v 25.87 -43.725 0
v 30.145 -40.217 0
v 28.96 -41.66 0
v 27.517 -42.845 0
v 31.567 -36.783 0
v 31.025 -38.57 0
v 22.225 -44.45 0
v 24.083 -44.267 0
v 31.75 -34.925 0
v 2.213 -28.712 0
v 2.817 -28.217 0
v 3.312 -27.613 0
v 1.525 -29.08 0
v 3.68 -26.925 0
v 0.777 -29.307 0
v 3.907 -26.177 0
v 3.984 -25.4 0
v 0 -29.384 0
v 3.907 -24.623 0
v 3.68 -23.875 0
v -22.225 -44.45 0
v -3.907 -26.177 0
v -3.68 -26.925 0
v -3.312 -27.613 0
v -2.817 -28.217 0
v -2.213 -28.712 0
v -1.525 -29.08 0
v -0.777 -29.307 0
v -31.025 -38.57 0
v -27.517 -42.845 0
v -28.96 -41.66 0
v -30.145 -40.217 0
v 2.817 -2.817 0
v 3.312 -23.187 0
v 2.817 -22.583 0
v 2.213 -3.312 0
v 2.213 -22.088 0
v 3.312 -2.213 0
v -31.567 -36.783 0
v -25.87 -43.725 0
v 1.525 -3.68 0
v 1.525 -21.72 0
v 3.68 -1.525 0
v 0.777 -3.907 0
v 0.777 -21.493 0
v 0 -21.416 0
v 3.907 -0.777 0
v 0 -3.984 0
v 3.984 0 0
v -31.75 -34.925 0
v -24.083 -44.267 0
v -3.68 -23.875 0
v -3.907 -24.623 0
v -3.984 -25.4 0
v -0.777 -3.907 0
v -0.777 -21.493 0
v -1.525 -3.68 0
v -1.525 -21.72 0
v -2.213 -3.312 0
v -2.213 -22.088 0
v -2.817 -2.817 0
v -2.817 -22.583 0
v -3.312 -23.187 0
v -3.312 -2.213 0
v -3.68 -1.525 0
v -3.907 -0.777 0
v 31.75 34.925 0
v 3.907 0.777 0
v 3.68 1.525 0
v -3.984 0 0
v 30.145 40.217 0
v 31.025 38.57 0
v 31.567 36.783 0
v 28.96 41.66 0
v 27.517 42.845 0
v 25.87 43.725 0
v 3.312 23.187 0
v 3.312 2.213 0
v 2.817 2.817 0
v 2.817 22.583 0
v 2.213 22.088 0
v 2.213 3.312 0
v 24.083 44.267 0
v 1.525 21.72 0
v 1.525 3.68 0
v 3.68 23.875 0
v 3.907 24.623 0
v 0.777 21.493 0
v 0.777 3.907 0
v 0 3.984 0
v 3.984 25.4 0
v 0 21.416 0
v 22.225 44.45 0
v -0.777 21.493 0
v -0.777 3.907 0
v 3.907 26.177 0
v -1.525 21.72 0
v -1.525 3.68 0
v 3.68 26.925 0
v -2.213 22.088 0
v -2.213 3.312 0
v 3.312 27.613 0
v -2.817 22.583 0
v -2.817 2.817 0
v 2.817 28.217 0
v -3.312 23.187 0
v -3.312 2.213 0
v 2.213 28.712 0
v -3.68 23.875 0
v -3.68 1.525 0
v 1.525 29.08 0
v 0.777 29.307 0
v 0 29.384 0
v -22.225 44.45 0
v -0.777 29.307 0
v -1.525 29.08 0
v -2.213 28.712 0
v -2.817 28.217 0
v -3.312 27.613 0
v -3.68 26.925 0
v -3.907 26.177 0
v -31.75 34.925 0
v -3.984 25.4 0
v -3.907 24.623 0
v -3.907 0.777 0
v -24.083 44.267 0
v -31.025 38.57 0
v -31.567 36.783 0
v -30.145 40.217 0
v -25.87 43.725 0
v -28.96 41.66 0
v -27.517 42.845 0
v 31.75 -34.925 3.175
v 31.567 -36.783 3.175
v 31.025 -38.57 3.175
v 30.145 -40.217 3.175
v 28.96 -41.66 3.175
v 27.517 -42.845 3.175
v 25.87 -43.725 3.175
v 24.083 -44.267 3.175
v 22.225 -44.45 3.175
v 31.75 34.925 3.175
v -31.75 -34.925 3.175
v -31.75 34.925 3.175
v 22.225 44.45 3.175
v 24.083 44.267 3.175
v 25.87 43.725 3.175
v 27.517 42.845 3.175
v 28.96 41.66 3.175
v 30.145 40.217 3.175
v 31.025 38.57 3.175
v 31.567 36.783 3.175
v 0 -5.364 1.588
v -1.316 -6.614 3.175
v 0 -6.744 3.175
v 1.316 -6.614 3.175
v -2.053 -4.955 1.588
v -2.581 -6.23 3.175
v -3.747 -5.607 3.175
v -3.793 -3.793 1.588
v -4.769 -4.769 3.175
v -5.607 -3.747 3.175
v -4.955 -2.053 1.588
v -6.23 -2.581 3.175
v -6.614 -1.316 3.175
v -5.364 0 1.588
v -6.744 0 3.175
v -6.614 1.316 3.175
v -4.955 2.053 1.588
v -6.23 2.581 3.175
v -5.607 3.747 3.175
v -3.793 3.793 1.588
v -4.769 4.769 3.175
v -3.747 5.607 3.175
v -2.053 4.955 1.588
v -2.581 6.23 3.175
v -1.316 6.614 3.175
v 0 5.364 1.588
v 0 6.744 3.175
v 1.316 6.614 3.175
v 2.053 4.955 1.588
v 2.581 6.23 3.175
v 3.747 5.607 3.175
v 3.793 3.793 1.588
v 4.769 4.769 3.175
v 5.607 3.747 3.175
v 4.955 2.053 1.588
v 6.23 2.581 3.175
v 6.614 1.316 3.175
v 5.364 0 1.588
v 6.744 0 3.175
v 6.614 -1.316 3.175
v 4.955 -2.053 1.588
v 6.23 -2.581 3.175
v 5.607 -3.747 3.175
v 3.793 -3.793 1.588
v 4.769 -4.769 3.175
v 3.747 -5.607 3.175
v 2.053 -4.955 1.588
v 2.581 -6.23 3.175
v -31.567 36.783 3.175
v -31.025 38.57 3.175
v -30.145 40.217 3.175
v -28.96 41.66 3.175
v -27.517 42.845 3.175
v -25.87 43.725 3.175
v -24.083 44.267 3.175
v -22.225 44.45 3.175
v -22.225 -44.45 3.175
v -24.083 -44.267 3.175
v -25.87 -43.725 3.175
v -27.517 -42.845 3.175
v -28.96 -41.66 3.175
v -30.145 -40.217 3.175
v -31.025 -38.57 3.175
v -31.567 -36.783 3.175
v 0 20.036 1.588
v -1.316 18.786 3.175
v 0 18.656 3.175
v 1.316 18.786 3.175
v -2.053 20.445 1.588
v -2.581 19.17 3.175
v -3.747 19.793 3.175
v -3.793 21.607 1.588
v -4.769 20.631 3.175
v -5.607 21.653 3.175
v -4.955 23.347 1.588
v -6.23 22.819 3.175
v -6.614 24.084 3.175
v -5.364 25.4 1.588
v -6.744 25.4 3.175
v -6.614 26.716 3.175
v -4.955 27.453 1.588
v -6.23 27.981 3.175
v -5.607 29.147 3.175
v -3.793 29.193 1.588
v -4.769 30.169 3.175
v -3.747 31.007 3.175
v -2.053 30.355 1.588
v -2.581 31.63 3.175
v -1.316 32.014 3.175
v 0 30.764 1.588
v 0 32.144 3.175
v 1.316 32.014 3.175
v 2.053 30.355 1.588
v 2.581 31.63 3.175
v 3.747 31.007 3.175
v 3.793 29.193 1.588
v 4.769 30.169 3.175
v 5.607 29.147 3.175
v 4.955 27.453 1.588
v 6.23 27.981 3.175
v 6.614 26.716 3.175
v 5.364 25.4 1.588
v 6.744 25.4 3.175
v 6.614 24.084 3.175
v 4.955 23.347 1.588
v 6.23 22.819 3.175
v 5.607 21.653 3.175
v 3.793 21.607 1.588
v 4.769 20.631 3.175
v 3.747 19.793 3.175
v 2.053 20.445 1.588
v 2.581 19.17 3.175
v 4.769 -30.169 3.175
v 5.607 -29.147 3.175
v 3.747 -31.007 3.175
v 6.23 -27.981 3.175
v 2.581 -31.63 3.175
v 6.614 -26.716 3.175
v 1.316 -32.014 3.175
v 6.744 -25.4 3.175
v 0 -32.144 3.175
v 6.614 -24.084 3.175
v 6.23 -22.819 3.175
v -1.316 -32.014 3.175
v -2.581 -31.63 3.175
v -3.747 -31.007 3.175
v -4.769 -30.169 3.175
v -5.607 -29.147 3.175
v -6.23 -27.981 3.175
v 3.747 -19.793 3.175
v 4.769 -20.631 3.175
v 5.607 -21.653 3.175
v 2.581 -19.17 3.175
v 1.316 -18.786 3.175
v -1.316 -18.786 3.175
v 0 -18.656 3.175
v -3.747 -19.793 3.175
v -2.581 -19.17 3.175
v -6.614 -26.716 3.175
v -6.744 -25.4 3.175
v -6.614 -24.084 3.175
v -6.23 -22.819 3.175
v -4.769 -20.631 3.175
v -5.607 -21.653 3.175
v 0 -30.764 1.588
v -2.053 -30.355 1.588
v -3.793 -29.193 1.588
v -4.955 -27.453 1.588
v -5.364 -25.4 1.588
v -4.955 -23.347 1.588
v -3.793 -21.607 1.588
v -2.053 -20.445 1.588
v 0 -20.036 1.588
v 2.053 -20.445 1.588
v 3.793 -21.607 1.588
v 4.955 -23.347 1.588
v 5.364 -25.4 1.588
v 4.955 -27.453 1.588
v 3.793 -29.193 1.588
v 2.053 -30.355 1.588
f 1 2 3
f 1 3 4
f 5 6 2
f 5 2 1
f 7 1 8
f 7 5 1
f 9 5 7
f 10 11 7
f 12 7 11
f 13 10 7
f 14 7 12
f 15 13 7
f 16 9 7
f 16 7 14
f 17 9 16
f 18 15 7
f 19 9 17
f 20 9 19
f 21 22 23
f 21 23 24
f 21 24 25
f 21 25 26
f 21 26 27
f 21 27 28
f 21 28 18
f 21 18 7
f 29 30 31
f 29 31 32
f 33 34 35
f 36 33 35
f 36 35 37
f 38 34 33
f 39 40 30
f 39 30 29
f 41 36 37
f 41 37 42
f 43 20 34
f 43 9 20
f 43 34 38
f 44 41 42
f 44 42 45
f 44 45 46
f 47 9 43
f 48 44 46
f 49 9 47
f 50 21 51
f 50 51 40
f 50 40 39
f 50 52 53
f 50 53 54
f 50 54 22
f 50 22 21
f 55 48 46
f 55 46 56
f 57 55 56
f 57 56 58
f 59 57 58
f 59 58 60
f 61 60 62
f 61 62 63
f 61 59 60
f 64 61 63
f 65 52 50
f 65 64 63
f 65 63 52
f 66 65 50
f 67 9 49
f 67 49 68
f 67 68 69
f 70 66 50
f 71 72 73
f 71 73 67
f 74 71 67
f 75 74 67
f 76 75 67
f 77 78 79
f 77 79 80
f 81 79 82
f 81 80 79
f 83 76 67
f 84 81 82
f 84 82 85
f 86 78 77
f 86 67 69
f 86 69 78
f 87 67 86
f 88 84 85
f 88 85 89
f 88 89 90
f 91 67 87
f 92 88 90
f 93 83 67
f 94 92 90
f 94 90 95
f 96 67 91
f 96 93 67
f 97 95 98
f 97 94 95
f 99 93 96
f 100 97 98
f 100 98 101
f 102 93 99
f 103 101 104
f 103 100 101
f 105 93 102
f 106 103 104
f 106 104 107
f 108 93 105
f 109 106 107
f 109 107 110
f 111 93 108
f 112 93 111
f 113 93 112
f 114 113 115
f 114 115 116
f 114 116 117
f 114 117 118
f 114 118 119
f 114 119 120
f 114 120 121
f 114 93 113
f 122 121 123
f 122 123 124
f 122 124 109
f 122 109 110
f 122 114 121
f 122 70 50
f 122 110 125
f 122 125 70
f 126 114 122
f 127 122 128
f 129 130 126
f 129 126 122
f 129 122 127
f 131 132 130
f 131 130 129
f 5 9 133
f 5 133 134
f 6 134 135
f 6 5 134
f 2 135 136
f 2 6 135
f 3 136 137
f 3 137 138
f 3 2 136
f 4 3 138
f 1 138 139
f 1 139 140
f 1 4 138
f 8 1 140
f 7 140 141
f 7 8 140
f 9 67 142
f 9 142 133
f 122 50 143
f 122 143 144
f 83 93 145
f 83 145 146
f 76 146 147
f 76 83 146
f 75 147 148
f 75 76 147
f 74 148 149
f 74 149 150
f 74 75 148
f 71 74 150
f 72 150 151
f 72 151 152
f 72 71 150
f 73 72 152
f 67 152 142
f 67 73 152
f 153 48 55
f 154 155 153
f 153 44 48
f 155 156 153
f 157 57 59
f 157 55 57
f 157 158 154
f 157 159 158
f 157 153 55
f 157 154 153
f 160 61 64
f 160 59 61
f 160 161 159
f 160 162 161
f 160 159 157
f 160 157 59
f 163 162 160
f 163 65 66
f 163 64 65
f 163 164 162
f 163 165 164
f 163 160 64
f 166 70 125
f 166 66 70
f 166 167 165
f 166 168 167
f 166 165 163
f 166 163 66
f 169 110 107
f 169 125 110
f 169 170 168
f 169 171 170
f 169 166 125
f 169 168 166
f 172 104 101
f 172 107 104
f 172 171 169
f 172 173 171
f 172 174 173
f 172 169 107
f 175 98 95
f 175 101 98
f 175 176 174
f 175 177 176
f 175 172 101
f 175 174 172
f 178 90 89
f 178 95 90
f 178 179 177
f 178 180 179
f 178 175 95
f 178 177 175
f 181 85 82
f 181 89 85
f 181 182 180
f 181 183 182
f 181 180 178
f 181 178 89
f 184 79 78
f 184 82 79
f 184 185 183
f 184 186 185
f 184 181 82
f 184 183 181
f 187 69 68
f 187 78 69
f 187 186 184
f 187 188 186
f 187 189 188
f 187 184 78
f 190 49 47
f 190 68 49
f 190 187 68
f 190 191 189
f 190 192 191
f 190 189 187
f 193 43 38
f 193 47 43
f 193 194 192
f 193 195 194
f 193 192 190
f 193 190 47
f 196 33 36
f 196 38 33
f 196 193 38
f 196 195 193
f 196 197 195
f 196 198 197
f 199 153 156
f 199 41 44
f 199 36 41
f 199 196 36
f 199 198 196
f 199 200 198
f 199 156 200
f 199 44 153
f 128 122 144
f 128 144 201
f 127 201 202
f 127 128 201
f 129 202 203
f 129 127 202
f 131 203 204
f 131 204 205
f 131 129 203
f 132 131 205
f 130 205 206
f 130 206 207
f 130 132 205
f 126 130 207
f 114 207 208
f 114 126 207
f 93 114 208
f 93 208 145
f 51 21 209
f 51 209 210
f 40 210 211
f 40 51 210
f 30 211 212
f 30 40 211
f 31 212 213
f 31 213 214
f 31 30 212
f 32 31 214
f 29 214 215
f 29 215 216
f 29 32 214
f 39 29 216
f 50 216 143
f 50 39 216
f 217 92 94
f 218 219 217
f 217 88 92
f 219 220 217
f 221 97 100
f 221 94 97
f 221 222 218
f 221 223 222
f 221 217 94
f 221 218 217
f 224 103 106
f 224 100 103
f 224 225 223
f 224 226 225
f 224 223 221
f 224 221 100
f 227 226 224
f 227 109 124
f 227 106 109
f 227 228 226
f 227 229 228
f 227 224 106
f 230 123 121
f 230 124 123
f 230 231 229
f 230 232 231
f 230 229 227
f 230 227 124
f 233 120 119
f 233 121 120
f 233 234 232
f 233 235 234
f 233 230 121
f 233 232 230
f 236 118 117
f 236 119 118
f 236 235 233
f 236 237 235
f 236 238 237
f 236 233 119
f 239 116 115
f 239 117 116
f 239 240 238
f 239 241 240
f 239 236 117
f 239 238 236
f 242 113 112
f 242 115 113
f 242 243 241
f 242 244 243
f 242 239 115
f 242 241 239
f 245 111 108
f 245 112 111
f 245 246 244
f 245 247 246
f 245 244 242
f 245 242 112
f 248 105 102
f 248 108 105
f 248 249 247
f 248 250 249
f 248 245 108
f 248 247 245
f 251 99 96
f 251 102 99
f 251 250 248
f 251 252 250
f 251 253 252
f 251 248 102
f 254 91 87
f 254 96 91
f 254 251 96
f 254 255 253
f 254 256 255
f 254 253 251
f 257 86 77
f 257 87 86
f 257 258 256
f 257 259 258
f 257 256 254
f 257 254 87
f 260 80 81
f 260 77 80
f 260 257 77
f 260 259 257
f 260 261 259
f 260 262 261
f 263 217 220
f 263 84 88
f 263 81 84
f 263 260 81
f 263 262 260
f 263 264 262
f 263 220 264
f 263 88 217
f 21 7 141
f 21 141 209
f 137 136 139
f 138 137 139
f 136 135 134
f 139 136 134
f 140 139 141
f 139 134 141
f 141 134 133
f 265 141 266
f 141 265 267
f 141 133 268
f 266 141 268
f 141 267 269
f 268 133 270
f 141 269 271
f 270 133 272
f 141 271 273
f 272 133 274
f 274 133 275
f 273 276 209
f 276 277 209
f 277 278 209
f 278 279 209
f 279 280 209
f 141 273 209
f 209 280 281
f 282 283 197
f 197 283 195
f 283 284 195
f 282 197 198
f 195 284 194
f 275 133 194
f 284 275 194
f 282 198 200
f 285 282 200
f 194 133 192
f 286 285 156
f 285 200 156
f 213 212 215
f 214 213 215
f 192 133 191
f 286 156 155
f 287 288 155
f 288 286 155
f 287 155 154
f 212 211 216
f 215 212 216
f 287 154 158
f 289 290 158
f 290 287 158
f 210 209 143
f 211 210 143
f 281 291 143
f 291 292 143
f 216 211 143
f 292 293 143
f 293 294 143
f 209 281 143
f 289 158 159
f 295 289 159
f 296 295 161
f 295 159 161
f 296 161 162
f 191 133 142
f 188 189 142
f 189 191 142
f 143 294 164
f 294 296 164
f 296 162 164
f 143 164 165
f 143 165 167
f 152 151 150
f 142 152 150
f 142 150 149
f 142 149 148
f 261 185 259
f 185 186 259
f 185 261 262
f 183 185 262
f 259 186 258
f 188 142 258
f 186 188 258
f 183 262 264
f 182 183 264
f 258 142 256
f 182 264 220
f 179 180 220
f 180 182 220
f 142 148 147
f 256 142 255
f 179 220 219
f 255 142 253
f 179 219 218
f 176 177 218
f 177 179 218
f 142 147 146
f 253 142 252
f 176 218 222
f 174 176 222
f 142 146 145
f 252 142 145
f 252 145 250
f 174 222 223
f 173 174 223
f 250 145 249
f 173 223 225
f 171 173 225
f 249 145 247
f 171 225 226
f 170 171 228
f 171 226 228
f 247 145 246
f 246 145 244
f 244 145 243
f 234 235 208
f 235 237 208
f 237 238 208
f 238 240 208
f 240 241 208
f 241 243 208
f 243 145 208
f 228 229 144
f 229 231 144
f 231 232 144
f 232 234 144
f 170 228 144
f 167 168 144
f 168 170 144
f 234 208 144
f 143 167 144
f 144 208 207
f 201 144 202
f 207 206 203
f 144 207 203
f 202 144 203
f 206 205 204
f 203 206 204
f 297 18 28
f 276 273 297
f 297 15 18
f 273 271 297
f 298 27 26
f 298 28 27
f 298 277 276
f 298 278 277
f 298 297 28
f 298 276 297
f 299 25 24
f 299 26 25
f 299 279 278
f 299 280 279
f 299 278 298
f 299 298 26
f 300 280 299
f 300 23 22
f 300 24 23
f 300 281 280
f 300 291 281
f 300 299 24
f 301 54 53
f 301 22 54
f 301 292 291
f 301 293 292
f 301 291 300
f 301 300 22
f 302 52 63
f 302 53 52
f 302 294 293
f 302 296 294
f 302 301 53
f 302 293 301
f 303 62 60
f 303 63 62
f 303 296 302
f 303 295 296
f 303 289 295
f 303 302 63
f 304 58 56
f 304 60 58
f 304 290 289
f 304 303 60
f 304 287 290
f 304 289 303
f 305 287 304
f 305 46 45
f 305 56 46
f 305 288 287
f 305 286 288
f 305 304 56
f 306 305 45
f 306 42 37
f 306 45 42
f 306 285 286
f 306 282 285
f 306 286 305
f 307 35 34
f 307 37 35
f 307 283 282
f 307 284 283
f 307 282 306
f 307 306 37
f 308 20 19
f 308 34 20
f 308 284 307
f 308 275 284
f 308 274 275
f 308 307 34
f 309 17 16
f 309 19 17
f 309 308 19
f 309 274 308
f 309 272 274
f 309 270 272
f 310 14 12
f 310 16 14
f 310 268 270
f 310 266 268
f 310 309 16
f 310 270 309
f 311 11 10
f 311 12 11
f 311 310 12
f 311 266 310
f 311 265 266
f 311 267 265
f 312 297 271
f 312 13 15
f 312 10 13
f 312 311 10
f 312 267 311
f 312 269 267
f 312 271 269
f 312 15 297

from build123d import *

# Parameters (mm, degrees)
SKETCH1_R                                    = 2.5527
BOSS_EXTRUDE1_DEPTH                          = 3.175
CSK_FOR_1_4_FLAT_HEAD_SOCKET_CAP_SCR_2_COUNT = 2
CSK_FOR_1_4_FLAT_HEAD_SOCKET_CAP_SCR_2_PITCH = 25.4
CSK_FOR_1_4_FLAT_HEAD_SOCKET_CAP_SCR_3_COUNT = 2
CSK_FOR_1_4_FLAT_HEAD_SOCKET_CAP_SCR_3_PITCH = 50.8


with BuildPart() as part:
    # Sketch1 → Boss-Extrude1 (new body)
    with BuildSketch(Plane.XY):
        with BuildLine():
            Line((-22.225, 44.45), (22.225, 44.45))
            ThreePointArc((22.225, 44.45), (28.960192091, 41.660192091), (31.75, 34.925))
            Line((31.75, 34.925), (31.75, -34.925))
            ThreePointArc((31.75, -34.925), (28.960192091, -41.660192091), (22.225, -44.45))
            Line((22.225, -44.45), (-22.225, -44.45))
            ThreePointArc((-22.225, -44.45), (-28.960192091, -41.660192091), (-31.75, -34.925))
            Line((-31.75, -34.925), (-31.75, 34.925))
            ThreePointArc((-31.75, 34.925), (-28.960192091, 41.660192091), (-22.225, 44.45))
        make_face()
        with Locations((0, 25.4)):
            Circle(SKETCH1_R, mode=Mode.SUBTRACT)
        Circle(SKETCH1_R, mode=Mode.SUBTRACT)
        with Locations((0, -25.4)):
            Circle(SKETCH1_R, mode=Mode.SUBTRACT)
    extrude(amount=BOSS_EXTRUDE1_DEPTH)

    # Sketch2 → CSK for 1/4 Flat Head Socket Cap Screw1 (revolve, cut)
    with BuildSketch(Plane(origin=(0, 25.4, 3.175), x_dir=(0, -1, 0), z_dir=(1, 0, 0))):
        Polygon((0, 0), (0, 3.175), (3.3782, 3.175), (3.3782, 3.871564875), (6.7437, 0), align=None)
    csk_for_1_4_flat_head_socket_cap_screw1 = revolve(axis=Axis((0, 25.4, 9.525), (0, 0, -1)), mode=Mode.SUBTRACT)

    # CSK for 1_4 Flat Head Socket Cap Scr 2: CSK for 1/4 Flat Head Socket Cap Screw1 ×2
    with Locations(*[(0, -i * CSK_FOR_1_4_FLAT_HEAD_SOCKET_CAP_SCR_2_PITCH, 0) for i in range(1, CSK_FOR_1_4_FLAT_HEAD_SOCKET_CAP_SCR_2_COUNT)]):
        add(csk_for_1_4_flat_head_socket_cap_screw1, mode=Mode.SUBTRACT)

    # CSK for 1_4 Flat Head Socket Cap Scr 3: CSK for 1/4 Flat Head Socket Cap Screw1 ×2
    with Locations(*[(0, -i * CSK_FOR_1_4_FLAT_HEAD_SOCKET_CAP_SCR_3_PITCH, 0) for i in range(1, CSK_FOR_1_4_FLAT_HEAD_SOCKET_CAP_SCR_3_COUNT)]):
        add(csk_for_1_4_flat_head_socket_cap_screw1, mode=Mode.SUBTRACT)


solid = part.part
